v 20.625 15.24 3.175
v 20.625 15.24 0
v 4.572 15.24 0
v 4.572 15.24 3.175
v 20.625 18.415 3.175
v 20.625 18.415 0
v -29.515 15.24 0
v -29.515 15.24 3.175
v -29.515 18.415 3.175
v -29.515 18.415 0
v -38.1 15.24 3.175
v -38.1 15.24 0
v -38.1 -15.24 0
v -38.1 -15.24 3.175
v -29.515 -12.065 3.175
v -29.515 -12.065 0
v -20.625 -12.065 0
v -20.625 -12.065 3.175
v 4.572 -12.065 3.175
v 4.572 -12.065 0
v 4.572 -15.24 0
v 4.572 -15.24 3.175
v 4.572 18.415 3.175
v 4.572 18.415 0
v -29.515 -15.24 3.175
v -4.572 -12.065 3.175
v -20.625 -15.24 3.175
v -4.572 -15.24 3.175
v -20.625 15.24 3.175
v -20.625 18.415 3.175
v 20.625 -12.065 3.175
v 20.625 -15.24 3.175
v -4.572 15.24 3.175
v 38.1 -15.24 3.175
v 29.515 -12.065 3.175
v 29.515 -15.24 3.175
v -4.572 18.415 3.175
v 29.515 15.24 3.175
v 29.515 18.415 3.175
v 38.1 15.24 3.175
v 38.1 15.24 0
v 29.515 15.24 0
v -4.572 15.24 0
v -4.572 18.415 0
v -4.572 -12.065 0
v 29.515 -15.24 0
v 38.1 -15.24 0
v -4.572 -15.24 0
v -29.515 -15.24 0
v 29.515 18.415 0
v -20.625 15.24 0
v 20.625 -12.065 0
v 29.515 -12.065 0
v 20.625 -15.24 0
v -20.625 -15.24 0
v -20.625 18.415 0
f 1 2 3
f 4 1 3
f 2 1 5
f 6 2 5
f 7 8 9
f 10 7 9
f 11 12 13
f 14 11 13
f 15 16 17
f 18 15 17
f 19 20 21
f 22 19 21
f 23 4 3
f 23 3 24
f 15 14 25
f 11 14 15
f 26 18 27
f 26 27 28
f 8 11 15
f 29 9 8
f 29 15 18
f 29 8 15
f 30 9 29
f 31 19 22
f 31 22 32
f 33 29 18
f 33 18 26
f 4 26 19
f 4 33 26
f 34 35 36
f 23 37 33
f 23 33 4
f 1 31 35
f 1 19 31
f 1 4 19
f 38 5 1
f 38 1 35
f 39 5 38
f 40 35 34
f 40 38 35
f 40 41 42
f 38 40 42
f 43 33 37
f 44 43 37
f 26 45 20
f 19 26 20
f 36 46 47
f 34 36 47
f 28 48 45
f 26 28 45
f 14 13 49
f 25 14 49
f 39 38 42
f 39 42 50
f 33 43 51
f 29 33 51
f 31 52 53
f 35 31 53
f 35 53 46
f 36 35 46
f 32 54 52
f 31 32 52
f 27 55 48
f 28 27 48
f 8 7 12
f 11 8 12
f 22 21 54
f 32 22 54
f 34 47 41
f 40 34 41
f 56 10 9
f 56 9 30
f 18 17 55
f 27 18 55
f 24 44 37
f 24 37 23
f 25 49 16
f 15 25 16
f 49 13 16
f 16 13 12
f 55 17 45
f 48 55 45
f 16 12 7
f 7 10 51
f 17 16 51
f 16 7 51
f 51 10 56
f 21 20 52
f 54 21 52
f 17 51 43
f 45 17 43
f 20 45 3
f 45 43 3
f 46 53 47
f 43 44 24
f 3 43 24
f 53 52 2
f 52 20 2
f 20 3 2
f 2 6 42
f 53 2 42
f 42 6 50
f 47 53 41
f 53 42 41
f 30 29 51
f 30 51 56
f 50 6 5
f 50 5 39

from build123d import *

# Parameters (mm, degrees)
F0_W     = 8.89
F0_H     = 3.175
F0_W_2   = 9.144
F1_DEPTH = 3.175


with BuildPart() as f1:
    # F0 (on Top) → F1 (new body)
    with BuildSketch(Plane.XY):
        with Locations((-25.0698, 16.8275)):
            Rectangle(F0_W, F0_H)
        Polygon((-29.5148, 15.24), (-38.1, 15.24), (-38.1, -15.24), (-29.5148, -15.24), (-29.5148, -12.065), (-20.6248, -12.065), (-20.6248, -15.24), (-4.572, -15.24), (-4.572, -12.065), (4.572, -12.065), (4.572, -15.24), (20.6248, -15.24), (20.6248, -12.065), (29.5148, -12.065), (29.5148, -15.24), (38.1, -15.24), (38.1, 15.24), (29.5148, 15.24), (20.6248, 15.24), (4.572, 15.24), (-4.572, 15.24), (-20.6248, 15.24), align=None)
        with Locations((0, 16.8275)):
            Rectangle(F0_W_2, F0_H)
        with Locations((25.0698, 16.8275)):
            Rectangle(F0_W, F0_H)
    extrude(amount=F1_DEPTH)


solid = f1.part
